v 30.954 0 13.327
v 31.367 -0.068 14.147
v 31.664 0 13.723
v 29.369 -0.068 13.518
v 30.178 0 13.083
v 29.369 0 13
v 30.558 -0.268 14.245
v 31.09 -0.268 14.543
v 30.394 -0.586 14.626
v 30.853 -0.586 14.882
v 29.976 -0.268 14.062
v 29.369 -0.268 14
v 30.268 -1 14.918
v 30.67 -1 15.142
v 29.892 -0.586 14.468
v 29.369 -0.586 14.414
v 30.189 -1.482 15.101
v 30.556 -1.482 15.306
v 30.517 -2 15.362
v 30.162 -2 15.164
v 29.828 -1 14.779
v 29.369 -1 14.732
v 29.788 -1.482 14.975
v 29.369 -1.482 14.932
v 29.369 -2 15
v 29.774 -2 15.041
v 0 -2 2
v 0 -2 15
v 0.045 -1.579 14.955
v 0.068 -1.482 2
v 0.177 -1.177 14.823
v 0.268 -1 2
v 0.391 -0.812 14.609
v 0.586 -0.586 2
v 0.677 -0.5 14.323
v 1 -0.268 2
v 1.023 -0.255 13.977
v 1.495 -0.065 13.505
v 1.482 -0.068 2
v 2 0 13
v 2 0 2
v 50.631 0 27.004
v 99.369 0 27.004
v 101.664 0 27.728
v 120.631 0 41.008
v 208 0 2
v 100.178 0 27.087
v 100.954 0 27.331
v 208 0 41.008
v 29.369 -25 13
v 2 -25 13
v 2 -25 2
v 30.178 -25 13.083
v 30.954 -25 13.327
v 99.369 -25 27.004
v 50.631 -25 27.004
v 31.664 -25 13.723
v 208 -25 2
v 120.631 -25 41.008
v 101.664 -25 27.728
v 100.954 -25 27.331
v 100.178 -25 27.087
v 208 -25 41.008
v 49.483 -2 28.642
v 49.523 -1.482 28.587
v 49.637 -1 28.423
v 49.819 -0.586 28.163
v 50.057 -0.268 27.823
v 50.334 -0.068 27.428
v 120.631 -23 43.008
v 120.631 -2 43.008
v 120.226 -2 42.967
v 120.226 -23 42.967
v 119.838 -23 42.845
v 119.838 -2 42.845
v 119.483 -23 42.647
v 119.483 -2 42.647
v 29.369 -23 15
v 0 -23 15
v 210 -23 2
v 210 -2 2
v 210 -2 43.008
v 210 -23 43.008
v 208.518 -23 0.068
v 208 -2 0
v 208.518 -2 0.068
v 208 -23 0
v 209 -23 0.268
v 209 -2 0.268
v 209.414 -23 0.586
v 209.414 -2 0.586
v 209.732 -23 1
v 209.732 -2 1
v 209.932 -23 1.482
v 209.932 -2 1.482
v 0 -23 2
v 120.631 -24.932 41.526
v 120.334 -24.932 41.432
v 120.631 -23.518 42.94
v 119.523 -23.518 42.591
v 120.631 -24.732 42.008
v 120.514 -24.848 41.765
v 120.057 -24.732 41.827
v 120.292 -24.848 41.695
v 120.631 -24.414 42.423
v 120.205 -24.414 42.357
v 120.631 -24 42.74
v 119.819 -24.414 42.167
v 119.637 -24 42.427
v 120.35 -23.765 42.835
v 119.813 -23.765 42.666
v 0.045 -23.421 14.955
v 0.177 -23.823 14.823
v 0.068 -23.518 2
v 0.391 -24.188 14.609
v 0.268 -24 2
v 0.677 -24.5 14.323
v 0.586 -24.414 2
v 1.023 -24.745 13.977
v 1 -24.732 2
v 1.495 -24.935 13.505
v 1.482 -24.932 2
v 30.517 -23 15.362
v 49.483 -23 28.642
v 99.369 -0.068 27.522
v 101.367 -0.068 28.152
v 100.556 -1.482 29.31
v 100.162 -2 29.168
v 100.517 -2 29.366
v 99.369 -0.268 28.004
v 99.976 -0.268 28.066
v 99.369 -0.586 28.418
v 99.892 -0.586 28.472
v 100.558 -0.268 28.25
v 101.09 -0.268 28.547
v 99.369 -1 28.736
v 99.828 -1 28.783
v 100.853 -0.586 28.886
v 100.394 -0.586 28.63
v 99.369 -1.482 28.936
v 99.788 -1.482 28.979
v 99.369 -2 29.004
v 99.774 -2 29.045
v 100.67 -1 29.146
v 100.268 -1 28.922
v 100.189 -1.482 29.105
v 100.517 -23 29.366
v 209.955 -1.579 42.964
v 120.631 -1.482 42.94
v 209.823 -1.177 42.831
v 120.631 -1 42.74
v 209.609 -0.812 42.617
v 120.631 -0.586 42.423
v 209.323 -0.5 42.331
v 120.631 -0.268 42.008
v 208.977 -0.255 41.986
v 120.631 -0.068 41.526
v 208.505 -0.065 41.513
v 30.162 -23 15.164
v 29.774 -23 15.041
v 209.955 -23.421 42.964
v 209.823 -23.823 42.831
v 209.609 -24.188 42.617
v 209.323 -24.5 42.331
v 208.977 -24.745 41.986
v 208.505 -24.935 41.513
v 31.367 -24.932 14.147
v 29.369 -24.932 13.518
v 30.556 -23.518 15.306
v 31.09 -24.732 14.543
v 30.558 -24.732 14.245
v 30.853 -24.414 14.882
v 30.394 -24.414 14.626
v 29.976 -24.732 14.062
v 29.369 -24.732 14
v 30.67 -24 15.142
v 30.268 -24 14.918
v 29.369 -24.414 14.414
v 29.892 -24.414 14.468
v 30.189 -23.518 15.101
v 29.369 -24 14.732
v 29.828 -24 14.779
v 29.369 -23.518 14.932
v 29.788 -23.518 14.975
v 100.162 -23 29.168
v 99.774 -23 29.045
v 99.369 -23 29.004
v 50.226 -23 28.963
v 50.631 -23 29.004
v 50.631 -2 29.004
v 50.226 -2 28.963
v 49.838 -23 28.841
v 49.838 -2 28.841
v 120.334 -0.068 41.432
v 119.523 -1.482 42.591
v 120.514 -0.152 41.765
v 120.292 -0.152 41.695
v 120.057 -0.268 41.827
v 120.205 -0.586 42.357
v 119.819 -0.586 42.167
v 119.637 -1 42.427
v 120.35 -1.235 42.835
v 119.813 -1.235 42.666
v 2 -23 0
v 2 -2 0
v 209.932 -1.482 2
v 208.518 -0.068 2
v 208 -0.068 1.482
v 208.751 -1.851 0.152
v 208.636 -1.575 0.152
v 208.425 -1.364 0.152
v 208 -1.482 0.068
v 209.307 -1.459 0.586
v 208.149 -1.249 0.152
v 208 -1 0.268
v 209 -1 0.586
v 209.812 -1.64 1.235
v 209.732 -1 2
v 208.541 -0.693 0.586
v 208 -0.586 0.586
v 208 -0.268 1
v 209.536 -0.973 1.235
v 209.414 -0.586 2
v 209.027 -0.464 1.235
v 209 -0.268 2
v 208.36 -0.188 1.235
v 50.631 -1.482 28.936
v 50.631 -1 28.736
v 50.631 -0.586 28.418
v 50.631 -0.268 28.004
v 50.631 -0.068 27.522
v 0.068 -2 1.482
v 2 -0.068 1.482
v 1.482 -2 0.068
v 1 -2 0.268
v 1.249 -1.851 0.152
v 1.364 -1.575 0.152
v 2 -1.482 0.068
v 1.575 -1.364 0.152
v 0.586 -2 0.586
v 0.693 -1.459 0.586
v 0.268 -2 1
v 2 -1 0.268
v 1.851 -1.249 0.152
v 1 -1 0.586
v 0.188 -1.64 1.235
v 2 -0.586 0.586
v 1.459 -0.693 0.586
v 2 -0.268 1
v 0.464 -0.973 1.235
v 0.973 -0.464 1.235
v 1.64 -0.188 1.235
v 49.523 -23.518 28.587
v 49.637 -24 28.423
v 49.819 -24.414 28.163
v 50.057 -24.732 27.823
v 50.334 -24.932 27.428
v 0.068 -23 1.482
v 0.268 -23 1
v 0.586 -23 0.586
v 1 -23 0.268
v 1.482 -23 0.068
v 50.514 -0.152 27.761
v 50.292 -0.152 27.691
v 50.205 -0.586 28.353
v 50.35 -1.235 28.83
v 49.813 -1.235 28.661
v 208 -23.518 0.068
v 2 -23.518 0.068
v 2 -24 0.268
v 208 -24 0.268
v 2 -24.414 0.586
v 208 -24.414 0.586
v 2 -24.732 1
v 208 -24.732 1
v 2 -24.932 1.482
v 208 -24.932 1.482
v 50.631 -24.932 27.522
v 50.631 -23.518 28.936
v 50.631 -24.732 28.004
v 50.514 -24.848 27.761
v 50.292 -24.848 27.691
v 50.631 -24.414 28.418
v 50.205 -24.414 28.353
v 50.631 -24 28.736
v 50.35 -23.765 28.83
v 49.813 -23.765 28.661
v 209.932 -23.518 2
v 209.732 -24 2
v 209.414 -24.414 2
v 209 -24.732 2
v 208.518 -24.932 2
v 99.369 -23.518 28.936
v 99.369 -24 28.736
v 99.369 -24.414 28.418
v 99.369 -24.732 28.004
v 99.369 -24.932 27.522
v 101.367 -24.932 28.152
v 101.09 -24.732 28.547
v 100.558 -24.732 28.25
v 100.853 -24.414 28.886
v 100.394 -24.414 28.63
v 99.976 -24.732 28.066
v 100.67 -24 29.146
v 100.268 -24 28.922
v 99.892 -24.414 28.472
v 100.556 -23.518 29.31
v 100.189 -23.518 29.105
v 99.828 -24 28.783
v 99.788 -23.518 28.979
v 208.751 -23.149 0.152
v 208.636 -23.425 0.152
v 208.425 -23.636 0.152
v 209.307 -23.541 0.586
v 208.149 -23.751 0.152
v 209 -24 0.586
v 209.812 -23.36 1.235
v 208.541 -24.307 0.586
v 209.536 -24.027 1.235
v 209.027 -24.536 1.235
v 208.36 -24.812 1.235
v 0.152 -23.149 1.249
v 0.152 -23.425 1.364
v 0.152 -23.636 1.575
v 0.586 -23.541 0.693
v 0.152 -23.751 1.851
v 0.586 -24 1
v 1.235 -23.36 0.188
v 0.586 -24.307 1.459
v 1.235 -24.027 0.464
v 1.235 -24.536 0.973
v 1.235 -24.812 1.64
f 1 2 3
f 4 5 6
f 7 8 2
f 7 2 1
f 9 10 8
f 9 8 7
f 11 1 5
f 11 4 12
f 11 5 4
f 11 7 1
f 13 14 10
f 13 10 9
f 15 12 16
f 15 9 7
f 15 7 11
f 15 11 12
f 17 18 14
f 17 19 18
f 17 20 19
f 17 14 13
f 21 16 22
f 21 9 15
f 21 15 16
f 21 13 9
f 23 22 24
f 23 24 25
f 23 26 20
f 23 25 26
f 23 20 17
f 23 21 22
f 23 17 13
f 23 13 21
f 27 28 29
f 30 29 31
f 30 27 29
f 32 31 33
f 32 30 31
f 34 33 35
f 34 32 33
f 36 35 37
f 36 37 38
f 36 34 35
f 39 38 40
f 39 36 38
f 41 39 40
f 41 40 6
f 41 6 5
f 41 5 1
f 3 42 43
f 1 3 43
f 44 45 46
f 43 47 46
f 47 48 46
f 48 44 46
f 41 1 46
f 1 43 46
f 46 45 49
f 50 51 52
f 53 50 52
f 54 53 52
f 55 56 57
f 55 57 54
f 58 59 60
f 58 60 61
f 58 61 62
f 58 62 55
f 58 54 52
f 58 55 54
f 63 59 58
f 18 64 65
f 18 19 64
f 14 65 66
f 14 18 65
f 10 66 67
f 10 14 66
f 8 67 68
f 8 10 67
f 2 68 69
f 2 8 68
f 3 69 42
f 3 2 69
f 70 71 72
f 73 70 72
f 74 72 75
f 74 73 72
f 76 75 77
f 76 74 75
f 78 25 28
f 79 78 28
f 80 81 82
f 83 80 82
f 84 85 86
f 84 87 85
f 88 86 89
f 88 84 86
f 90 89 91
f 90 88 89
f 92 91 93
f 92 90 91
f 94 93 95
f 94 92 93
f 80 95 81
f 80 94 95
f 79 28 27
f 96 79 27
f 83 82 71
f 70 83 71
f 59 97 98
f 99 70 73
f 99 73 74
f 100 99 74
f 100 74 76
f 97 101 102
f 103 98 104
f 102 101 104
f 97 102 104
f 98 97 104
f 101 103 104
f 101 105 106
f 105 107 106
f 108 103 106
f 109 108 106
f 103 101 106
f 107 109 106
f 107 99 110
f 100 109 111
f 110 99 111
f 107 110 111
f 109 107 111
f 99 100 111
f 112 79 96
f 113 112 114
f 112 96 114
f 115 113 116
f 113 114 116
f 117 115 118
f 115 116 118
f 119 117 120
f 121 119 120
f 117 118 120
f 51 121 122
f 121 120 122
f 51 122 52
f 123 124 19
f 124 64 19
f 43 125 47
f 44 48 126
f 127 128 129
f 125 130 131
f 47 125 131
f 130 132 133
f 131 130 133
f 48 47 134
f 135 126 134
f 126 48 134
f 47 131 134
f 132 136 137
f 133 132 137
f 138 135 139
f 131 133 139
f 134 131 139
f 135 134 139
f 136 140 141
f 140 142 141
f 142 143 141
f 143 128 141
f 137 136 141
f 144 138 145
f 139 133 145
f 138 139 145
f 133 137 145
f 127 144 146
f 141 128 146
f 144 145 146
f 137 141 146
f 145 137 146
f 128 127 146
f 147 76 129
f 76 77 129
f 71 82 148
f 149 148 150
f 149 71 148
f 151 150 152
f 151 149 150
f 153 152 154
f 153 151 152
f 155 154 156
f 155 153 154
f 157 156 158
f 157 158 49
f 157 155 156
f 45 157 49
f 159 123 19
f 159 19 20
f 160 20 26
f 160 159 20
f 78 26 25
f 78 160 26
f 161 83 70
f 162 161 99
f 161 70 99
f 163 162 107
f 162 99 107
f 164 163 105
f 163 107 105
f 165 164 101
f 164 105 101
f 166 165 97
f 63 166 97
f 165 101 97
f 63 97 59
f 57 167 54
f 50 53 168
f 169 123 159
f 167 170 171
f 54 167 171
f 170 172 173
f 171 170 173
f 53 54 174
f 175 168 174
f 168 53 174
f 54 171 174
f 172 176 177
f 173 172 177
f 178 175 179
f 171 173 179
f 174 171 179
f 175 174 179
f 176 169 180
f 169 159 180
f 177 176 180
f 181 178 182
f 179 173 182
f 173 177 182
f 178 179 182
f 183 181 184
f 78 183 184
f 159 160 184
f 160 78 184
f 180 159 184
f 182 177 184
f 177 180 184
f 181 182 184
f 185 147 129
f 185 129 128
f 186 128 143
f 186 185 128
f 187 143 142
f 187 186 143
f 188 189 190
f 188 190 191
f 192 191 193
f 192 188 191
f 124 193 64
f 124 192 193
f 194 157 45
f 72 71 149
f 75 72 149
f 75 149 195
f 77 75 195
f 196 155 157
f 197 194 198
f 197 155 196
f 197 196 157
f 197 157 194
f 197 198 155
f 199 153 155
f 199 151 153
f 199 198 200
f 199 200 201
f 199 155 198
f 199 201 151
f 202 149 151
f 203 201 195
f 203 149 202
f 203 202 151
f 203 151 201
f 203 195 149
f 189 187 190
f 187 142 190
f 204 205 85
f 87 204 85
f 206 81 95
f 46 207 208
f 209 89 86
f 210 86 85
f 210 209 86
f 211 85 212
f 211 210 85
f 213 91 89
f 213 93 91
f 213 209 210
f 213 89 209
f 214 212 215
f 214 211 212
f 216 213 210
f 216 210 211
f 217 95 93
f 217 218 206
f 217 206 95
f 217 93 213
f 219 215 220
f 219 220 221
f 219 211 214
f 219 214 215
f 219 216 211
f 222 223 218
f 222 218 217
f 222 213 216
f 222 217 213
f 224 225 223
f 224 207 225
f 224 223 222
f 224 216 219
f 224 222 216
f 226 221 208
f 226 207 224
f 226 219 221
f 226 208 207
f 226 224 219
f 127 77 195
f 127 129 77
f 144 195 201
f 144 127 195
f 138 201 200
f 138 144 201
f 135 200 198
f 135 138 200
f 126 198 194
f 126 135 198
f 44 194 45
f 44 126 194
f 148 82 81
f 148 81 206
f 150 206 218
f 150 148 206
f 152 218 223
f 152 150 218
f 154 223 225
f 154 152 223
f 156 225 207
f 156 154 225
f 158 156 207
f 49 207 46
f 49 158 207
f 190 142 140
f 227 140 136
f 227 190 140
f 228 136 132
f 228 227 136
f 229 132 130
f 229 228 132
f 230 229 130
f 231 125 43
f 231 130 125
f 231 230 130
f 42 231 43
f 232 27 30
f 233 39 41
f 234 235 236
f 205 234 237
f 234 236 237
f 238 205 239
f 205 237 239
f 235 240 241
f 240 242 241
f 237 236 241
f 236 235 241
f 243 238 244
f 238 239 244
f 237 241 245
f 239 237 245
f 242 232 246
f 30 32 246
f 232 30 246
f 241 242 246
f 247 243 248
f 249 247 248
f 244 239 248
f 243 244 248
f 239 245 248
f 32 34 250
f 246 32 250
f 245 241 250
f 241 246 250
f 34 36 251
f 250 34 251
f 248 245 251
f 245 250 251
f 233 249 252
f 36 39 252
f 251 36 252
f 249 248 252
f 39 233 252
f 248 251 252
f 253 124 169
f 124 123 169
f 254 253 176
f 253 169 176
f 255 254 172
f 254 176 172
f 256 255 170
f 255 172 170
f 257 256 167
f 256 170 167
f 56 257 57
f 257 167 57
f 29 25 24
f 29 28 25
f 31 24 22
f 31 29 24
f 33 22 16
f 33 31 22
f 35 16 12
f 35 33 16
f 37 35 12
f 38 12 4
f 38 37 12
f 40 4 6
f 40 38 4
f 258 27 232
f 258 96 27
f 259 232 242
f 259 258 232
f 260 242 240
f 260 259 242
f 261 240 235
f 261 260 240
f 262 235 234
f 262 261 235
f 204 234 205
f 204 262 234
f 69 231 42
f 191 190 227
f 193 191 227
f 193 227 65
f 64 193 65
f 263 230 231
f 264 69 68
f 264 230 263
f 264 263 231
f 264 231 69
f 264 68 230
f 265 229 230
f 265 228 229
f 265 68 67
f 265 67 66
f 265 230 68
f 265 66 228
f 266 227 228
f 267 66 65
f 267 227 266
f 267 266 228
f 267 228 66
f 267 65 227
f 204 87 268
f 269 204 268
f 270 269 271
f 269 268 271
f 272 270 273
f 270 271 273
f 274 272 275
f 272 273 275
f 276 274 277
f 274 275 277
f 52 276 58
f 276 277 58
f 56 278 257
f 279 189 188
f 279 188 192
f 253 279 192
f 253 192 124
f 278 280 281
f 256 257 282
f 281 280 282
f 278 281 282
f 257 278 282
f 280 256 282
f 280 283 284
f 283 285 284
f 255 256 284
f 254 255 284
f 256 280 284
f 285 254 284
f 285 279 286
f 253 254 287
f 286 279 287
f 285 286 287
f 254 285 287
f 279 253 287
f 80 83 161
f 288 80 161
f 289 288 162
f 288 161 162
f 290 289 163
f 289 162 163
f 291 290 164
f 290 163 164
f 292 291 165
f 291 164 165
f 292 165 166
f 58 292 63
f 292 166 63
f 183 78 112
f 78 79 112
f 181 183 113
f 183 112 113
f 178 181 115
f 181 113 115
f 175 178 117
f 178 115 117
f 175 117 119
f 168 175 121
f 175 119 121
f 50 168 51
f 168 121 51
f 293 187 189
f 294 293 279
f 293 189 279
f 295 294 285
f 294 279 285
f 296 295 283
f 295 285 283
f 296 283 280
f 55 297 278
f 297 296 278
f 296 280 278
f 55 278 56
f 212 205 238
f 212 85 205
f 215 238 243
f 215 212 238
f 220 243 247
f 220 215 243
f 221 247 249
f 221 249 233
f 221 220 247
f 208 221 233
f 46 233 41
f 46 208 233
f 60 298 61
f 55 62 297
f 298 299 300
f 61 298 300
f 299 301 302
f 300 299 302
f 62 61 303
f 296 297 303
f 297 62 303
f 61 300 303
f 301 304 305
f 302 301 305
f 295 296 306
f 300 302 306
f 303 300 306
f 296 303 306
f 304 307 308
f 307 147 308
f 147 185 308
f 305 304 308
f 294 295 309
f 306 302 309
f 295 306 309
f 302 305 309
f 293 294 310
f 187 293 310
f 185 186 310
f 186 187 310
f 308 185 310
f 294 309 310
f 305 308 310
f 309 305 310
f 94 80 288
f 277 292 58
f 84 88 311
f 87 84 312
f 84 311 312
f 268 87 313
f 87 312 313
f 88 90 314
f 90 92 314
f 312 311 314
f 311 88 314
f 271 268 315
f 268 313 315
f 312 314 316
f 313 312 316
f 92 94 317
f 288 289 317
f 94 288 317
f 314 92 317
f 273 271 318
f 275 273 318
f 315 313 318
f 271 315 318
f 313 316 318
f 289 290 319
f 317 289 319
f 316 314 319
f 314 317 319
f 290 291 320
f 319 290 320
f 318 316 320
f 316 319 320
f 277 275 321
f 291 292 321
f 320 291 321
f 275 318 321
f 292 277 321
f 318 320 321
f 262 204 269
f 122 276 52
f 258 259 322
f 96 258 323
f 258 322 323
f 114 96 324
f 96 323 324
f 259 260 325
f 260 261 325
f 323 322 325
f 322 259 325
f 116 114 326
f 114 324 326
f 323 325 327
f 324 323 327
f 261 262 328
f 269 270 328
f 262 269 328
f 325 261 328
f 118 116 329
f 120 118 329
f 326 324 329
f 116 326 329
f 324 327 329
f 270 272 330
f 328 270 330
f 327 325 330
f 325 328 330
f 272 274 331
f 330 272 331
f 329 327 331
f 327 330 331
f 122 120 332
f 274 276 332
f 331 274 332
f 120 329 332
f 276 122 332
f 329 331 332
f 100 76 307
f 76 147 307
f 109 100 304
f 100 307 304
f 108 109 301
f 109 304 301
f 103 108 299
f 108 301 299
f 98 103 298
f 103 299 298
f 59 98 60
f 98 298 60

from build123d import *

# Parameters (mm, degrees)
F1_DEPTH = 25
F2_R     = 2


with BuildPart() as f1:
    # F0 (on Front) → F1 (new body)
    with BuildSketch(Plane.XZ):
        Polygon((0, 15), (0, 0), (210, 0), (210, 43.008302), (120, 43.008302), (100, 29.004151), (50, 29.004151), (30, 15), align=None)
    extrude(amount=F1_DEPTH)

    # F2
    f2_edges = [f1.edges().sort_by_distance(p)[0] for p in [
        (165, -25, 43.008302),
        (165, 0, 43.008302),
        (210, -25, 21.504151),
        (210, 0, 21.504151),
        (210, -12.5, 0),
        (105, -25, 0),
        (110, -25, 36.006226),
        (75, -25, 29.004151),
        (40, -25, 22.002075),
        (15, -25, 15),
        (15, 0, 15),
        (30, -12.5, 15),
        (40, 0, 22.002075),
        (50, -12.5, 29.004151),
        (75, 0, 29.004151),
        (110, 0, 36.006226),
        (100, -12.5, 29.004151),
        (120, -12.5, 43.008302),
        (0, 0, 7.5),
        (0, -12.5, 0),
        (0, -25, 7.5),
        (105, 0, 0),
    ]]
    fillet(f2_edges, radius=F2_R)


solid = f1.part
